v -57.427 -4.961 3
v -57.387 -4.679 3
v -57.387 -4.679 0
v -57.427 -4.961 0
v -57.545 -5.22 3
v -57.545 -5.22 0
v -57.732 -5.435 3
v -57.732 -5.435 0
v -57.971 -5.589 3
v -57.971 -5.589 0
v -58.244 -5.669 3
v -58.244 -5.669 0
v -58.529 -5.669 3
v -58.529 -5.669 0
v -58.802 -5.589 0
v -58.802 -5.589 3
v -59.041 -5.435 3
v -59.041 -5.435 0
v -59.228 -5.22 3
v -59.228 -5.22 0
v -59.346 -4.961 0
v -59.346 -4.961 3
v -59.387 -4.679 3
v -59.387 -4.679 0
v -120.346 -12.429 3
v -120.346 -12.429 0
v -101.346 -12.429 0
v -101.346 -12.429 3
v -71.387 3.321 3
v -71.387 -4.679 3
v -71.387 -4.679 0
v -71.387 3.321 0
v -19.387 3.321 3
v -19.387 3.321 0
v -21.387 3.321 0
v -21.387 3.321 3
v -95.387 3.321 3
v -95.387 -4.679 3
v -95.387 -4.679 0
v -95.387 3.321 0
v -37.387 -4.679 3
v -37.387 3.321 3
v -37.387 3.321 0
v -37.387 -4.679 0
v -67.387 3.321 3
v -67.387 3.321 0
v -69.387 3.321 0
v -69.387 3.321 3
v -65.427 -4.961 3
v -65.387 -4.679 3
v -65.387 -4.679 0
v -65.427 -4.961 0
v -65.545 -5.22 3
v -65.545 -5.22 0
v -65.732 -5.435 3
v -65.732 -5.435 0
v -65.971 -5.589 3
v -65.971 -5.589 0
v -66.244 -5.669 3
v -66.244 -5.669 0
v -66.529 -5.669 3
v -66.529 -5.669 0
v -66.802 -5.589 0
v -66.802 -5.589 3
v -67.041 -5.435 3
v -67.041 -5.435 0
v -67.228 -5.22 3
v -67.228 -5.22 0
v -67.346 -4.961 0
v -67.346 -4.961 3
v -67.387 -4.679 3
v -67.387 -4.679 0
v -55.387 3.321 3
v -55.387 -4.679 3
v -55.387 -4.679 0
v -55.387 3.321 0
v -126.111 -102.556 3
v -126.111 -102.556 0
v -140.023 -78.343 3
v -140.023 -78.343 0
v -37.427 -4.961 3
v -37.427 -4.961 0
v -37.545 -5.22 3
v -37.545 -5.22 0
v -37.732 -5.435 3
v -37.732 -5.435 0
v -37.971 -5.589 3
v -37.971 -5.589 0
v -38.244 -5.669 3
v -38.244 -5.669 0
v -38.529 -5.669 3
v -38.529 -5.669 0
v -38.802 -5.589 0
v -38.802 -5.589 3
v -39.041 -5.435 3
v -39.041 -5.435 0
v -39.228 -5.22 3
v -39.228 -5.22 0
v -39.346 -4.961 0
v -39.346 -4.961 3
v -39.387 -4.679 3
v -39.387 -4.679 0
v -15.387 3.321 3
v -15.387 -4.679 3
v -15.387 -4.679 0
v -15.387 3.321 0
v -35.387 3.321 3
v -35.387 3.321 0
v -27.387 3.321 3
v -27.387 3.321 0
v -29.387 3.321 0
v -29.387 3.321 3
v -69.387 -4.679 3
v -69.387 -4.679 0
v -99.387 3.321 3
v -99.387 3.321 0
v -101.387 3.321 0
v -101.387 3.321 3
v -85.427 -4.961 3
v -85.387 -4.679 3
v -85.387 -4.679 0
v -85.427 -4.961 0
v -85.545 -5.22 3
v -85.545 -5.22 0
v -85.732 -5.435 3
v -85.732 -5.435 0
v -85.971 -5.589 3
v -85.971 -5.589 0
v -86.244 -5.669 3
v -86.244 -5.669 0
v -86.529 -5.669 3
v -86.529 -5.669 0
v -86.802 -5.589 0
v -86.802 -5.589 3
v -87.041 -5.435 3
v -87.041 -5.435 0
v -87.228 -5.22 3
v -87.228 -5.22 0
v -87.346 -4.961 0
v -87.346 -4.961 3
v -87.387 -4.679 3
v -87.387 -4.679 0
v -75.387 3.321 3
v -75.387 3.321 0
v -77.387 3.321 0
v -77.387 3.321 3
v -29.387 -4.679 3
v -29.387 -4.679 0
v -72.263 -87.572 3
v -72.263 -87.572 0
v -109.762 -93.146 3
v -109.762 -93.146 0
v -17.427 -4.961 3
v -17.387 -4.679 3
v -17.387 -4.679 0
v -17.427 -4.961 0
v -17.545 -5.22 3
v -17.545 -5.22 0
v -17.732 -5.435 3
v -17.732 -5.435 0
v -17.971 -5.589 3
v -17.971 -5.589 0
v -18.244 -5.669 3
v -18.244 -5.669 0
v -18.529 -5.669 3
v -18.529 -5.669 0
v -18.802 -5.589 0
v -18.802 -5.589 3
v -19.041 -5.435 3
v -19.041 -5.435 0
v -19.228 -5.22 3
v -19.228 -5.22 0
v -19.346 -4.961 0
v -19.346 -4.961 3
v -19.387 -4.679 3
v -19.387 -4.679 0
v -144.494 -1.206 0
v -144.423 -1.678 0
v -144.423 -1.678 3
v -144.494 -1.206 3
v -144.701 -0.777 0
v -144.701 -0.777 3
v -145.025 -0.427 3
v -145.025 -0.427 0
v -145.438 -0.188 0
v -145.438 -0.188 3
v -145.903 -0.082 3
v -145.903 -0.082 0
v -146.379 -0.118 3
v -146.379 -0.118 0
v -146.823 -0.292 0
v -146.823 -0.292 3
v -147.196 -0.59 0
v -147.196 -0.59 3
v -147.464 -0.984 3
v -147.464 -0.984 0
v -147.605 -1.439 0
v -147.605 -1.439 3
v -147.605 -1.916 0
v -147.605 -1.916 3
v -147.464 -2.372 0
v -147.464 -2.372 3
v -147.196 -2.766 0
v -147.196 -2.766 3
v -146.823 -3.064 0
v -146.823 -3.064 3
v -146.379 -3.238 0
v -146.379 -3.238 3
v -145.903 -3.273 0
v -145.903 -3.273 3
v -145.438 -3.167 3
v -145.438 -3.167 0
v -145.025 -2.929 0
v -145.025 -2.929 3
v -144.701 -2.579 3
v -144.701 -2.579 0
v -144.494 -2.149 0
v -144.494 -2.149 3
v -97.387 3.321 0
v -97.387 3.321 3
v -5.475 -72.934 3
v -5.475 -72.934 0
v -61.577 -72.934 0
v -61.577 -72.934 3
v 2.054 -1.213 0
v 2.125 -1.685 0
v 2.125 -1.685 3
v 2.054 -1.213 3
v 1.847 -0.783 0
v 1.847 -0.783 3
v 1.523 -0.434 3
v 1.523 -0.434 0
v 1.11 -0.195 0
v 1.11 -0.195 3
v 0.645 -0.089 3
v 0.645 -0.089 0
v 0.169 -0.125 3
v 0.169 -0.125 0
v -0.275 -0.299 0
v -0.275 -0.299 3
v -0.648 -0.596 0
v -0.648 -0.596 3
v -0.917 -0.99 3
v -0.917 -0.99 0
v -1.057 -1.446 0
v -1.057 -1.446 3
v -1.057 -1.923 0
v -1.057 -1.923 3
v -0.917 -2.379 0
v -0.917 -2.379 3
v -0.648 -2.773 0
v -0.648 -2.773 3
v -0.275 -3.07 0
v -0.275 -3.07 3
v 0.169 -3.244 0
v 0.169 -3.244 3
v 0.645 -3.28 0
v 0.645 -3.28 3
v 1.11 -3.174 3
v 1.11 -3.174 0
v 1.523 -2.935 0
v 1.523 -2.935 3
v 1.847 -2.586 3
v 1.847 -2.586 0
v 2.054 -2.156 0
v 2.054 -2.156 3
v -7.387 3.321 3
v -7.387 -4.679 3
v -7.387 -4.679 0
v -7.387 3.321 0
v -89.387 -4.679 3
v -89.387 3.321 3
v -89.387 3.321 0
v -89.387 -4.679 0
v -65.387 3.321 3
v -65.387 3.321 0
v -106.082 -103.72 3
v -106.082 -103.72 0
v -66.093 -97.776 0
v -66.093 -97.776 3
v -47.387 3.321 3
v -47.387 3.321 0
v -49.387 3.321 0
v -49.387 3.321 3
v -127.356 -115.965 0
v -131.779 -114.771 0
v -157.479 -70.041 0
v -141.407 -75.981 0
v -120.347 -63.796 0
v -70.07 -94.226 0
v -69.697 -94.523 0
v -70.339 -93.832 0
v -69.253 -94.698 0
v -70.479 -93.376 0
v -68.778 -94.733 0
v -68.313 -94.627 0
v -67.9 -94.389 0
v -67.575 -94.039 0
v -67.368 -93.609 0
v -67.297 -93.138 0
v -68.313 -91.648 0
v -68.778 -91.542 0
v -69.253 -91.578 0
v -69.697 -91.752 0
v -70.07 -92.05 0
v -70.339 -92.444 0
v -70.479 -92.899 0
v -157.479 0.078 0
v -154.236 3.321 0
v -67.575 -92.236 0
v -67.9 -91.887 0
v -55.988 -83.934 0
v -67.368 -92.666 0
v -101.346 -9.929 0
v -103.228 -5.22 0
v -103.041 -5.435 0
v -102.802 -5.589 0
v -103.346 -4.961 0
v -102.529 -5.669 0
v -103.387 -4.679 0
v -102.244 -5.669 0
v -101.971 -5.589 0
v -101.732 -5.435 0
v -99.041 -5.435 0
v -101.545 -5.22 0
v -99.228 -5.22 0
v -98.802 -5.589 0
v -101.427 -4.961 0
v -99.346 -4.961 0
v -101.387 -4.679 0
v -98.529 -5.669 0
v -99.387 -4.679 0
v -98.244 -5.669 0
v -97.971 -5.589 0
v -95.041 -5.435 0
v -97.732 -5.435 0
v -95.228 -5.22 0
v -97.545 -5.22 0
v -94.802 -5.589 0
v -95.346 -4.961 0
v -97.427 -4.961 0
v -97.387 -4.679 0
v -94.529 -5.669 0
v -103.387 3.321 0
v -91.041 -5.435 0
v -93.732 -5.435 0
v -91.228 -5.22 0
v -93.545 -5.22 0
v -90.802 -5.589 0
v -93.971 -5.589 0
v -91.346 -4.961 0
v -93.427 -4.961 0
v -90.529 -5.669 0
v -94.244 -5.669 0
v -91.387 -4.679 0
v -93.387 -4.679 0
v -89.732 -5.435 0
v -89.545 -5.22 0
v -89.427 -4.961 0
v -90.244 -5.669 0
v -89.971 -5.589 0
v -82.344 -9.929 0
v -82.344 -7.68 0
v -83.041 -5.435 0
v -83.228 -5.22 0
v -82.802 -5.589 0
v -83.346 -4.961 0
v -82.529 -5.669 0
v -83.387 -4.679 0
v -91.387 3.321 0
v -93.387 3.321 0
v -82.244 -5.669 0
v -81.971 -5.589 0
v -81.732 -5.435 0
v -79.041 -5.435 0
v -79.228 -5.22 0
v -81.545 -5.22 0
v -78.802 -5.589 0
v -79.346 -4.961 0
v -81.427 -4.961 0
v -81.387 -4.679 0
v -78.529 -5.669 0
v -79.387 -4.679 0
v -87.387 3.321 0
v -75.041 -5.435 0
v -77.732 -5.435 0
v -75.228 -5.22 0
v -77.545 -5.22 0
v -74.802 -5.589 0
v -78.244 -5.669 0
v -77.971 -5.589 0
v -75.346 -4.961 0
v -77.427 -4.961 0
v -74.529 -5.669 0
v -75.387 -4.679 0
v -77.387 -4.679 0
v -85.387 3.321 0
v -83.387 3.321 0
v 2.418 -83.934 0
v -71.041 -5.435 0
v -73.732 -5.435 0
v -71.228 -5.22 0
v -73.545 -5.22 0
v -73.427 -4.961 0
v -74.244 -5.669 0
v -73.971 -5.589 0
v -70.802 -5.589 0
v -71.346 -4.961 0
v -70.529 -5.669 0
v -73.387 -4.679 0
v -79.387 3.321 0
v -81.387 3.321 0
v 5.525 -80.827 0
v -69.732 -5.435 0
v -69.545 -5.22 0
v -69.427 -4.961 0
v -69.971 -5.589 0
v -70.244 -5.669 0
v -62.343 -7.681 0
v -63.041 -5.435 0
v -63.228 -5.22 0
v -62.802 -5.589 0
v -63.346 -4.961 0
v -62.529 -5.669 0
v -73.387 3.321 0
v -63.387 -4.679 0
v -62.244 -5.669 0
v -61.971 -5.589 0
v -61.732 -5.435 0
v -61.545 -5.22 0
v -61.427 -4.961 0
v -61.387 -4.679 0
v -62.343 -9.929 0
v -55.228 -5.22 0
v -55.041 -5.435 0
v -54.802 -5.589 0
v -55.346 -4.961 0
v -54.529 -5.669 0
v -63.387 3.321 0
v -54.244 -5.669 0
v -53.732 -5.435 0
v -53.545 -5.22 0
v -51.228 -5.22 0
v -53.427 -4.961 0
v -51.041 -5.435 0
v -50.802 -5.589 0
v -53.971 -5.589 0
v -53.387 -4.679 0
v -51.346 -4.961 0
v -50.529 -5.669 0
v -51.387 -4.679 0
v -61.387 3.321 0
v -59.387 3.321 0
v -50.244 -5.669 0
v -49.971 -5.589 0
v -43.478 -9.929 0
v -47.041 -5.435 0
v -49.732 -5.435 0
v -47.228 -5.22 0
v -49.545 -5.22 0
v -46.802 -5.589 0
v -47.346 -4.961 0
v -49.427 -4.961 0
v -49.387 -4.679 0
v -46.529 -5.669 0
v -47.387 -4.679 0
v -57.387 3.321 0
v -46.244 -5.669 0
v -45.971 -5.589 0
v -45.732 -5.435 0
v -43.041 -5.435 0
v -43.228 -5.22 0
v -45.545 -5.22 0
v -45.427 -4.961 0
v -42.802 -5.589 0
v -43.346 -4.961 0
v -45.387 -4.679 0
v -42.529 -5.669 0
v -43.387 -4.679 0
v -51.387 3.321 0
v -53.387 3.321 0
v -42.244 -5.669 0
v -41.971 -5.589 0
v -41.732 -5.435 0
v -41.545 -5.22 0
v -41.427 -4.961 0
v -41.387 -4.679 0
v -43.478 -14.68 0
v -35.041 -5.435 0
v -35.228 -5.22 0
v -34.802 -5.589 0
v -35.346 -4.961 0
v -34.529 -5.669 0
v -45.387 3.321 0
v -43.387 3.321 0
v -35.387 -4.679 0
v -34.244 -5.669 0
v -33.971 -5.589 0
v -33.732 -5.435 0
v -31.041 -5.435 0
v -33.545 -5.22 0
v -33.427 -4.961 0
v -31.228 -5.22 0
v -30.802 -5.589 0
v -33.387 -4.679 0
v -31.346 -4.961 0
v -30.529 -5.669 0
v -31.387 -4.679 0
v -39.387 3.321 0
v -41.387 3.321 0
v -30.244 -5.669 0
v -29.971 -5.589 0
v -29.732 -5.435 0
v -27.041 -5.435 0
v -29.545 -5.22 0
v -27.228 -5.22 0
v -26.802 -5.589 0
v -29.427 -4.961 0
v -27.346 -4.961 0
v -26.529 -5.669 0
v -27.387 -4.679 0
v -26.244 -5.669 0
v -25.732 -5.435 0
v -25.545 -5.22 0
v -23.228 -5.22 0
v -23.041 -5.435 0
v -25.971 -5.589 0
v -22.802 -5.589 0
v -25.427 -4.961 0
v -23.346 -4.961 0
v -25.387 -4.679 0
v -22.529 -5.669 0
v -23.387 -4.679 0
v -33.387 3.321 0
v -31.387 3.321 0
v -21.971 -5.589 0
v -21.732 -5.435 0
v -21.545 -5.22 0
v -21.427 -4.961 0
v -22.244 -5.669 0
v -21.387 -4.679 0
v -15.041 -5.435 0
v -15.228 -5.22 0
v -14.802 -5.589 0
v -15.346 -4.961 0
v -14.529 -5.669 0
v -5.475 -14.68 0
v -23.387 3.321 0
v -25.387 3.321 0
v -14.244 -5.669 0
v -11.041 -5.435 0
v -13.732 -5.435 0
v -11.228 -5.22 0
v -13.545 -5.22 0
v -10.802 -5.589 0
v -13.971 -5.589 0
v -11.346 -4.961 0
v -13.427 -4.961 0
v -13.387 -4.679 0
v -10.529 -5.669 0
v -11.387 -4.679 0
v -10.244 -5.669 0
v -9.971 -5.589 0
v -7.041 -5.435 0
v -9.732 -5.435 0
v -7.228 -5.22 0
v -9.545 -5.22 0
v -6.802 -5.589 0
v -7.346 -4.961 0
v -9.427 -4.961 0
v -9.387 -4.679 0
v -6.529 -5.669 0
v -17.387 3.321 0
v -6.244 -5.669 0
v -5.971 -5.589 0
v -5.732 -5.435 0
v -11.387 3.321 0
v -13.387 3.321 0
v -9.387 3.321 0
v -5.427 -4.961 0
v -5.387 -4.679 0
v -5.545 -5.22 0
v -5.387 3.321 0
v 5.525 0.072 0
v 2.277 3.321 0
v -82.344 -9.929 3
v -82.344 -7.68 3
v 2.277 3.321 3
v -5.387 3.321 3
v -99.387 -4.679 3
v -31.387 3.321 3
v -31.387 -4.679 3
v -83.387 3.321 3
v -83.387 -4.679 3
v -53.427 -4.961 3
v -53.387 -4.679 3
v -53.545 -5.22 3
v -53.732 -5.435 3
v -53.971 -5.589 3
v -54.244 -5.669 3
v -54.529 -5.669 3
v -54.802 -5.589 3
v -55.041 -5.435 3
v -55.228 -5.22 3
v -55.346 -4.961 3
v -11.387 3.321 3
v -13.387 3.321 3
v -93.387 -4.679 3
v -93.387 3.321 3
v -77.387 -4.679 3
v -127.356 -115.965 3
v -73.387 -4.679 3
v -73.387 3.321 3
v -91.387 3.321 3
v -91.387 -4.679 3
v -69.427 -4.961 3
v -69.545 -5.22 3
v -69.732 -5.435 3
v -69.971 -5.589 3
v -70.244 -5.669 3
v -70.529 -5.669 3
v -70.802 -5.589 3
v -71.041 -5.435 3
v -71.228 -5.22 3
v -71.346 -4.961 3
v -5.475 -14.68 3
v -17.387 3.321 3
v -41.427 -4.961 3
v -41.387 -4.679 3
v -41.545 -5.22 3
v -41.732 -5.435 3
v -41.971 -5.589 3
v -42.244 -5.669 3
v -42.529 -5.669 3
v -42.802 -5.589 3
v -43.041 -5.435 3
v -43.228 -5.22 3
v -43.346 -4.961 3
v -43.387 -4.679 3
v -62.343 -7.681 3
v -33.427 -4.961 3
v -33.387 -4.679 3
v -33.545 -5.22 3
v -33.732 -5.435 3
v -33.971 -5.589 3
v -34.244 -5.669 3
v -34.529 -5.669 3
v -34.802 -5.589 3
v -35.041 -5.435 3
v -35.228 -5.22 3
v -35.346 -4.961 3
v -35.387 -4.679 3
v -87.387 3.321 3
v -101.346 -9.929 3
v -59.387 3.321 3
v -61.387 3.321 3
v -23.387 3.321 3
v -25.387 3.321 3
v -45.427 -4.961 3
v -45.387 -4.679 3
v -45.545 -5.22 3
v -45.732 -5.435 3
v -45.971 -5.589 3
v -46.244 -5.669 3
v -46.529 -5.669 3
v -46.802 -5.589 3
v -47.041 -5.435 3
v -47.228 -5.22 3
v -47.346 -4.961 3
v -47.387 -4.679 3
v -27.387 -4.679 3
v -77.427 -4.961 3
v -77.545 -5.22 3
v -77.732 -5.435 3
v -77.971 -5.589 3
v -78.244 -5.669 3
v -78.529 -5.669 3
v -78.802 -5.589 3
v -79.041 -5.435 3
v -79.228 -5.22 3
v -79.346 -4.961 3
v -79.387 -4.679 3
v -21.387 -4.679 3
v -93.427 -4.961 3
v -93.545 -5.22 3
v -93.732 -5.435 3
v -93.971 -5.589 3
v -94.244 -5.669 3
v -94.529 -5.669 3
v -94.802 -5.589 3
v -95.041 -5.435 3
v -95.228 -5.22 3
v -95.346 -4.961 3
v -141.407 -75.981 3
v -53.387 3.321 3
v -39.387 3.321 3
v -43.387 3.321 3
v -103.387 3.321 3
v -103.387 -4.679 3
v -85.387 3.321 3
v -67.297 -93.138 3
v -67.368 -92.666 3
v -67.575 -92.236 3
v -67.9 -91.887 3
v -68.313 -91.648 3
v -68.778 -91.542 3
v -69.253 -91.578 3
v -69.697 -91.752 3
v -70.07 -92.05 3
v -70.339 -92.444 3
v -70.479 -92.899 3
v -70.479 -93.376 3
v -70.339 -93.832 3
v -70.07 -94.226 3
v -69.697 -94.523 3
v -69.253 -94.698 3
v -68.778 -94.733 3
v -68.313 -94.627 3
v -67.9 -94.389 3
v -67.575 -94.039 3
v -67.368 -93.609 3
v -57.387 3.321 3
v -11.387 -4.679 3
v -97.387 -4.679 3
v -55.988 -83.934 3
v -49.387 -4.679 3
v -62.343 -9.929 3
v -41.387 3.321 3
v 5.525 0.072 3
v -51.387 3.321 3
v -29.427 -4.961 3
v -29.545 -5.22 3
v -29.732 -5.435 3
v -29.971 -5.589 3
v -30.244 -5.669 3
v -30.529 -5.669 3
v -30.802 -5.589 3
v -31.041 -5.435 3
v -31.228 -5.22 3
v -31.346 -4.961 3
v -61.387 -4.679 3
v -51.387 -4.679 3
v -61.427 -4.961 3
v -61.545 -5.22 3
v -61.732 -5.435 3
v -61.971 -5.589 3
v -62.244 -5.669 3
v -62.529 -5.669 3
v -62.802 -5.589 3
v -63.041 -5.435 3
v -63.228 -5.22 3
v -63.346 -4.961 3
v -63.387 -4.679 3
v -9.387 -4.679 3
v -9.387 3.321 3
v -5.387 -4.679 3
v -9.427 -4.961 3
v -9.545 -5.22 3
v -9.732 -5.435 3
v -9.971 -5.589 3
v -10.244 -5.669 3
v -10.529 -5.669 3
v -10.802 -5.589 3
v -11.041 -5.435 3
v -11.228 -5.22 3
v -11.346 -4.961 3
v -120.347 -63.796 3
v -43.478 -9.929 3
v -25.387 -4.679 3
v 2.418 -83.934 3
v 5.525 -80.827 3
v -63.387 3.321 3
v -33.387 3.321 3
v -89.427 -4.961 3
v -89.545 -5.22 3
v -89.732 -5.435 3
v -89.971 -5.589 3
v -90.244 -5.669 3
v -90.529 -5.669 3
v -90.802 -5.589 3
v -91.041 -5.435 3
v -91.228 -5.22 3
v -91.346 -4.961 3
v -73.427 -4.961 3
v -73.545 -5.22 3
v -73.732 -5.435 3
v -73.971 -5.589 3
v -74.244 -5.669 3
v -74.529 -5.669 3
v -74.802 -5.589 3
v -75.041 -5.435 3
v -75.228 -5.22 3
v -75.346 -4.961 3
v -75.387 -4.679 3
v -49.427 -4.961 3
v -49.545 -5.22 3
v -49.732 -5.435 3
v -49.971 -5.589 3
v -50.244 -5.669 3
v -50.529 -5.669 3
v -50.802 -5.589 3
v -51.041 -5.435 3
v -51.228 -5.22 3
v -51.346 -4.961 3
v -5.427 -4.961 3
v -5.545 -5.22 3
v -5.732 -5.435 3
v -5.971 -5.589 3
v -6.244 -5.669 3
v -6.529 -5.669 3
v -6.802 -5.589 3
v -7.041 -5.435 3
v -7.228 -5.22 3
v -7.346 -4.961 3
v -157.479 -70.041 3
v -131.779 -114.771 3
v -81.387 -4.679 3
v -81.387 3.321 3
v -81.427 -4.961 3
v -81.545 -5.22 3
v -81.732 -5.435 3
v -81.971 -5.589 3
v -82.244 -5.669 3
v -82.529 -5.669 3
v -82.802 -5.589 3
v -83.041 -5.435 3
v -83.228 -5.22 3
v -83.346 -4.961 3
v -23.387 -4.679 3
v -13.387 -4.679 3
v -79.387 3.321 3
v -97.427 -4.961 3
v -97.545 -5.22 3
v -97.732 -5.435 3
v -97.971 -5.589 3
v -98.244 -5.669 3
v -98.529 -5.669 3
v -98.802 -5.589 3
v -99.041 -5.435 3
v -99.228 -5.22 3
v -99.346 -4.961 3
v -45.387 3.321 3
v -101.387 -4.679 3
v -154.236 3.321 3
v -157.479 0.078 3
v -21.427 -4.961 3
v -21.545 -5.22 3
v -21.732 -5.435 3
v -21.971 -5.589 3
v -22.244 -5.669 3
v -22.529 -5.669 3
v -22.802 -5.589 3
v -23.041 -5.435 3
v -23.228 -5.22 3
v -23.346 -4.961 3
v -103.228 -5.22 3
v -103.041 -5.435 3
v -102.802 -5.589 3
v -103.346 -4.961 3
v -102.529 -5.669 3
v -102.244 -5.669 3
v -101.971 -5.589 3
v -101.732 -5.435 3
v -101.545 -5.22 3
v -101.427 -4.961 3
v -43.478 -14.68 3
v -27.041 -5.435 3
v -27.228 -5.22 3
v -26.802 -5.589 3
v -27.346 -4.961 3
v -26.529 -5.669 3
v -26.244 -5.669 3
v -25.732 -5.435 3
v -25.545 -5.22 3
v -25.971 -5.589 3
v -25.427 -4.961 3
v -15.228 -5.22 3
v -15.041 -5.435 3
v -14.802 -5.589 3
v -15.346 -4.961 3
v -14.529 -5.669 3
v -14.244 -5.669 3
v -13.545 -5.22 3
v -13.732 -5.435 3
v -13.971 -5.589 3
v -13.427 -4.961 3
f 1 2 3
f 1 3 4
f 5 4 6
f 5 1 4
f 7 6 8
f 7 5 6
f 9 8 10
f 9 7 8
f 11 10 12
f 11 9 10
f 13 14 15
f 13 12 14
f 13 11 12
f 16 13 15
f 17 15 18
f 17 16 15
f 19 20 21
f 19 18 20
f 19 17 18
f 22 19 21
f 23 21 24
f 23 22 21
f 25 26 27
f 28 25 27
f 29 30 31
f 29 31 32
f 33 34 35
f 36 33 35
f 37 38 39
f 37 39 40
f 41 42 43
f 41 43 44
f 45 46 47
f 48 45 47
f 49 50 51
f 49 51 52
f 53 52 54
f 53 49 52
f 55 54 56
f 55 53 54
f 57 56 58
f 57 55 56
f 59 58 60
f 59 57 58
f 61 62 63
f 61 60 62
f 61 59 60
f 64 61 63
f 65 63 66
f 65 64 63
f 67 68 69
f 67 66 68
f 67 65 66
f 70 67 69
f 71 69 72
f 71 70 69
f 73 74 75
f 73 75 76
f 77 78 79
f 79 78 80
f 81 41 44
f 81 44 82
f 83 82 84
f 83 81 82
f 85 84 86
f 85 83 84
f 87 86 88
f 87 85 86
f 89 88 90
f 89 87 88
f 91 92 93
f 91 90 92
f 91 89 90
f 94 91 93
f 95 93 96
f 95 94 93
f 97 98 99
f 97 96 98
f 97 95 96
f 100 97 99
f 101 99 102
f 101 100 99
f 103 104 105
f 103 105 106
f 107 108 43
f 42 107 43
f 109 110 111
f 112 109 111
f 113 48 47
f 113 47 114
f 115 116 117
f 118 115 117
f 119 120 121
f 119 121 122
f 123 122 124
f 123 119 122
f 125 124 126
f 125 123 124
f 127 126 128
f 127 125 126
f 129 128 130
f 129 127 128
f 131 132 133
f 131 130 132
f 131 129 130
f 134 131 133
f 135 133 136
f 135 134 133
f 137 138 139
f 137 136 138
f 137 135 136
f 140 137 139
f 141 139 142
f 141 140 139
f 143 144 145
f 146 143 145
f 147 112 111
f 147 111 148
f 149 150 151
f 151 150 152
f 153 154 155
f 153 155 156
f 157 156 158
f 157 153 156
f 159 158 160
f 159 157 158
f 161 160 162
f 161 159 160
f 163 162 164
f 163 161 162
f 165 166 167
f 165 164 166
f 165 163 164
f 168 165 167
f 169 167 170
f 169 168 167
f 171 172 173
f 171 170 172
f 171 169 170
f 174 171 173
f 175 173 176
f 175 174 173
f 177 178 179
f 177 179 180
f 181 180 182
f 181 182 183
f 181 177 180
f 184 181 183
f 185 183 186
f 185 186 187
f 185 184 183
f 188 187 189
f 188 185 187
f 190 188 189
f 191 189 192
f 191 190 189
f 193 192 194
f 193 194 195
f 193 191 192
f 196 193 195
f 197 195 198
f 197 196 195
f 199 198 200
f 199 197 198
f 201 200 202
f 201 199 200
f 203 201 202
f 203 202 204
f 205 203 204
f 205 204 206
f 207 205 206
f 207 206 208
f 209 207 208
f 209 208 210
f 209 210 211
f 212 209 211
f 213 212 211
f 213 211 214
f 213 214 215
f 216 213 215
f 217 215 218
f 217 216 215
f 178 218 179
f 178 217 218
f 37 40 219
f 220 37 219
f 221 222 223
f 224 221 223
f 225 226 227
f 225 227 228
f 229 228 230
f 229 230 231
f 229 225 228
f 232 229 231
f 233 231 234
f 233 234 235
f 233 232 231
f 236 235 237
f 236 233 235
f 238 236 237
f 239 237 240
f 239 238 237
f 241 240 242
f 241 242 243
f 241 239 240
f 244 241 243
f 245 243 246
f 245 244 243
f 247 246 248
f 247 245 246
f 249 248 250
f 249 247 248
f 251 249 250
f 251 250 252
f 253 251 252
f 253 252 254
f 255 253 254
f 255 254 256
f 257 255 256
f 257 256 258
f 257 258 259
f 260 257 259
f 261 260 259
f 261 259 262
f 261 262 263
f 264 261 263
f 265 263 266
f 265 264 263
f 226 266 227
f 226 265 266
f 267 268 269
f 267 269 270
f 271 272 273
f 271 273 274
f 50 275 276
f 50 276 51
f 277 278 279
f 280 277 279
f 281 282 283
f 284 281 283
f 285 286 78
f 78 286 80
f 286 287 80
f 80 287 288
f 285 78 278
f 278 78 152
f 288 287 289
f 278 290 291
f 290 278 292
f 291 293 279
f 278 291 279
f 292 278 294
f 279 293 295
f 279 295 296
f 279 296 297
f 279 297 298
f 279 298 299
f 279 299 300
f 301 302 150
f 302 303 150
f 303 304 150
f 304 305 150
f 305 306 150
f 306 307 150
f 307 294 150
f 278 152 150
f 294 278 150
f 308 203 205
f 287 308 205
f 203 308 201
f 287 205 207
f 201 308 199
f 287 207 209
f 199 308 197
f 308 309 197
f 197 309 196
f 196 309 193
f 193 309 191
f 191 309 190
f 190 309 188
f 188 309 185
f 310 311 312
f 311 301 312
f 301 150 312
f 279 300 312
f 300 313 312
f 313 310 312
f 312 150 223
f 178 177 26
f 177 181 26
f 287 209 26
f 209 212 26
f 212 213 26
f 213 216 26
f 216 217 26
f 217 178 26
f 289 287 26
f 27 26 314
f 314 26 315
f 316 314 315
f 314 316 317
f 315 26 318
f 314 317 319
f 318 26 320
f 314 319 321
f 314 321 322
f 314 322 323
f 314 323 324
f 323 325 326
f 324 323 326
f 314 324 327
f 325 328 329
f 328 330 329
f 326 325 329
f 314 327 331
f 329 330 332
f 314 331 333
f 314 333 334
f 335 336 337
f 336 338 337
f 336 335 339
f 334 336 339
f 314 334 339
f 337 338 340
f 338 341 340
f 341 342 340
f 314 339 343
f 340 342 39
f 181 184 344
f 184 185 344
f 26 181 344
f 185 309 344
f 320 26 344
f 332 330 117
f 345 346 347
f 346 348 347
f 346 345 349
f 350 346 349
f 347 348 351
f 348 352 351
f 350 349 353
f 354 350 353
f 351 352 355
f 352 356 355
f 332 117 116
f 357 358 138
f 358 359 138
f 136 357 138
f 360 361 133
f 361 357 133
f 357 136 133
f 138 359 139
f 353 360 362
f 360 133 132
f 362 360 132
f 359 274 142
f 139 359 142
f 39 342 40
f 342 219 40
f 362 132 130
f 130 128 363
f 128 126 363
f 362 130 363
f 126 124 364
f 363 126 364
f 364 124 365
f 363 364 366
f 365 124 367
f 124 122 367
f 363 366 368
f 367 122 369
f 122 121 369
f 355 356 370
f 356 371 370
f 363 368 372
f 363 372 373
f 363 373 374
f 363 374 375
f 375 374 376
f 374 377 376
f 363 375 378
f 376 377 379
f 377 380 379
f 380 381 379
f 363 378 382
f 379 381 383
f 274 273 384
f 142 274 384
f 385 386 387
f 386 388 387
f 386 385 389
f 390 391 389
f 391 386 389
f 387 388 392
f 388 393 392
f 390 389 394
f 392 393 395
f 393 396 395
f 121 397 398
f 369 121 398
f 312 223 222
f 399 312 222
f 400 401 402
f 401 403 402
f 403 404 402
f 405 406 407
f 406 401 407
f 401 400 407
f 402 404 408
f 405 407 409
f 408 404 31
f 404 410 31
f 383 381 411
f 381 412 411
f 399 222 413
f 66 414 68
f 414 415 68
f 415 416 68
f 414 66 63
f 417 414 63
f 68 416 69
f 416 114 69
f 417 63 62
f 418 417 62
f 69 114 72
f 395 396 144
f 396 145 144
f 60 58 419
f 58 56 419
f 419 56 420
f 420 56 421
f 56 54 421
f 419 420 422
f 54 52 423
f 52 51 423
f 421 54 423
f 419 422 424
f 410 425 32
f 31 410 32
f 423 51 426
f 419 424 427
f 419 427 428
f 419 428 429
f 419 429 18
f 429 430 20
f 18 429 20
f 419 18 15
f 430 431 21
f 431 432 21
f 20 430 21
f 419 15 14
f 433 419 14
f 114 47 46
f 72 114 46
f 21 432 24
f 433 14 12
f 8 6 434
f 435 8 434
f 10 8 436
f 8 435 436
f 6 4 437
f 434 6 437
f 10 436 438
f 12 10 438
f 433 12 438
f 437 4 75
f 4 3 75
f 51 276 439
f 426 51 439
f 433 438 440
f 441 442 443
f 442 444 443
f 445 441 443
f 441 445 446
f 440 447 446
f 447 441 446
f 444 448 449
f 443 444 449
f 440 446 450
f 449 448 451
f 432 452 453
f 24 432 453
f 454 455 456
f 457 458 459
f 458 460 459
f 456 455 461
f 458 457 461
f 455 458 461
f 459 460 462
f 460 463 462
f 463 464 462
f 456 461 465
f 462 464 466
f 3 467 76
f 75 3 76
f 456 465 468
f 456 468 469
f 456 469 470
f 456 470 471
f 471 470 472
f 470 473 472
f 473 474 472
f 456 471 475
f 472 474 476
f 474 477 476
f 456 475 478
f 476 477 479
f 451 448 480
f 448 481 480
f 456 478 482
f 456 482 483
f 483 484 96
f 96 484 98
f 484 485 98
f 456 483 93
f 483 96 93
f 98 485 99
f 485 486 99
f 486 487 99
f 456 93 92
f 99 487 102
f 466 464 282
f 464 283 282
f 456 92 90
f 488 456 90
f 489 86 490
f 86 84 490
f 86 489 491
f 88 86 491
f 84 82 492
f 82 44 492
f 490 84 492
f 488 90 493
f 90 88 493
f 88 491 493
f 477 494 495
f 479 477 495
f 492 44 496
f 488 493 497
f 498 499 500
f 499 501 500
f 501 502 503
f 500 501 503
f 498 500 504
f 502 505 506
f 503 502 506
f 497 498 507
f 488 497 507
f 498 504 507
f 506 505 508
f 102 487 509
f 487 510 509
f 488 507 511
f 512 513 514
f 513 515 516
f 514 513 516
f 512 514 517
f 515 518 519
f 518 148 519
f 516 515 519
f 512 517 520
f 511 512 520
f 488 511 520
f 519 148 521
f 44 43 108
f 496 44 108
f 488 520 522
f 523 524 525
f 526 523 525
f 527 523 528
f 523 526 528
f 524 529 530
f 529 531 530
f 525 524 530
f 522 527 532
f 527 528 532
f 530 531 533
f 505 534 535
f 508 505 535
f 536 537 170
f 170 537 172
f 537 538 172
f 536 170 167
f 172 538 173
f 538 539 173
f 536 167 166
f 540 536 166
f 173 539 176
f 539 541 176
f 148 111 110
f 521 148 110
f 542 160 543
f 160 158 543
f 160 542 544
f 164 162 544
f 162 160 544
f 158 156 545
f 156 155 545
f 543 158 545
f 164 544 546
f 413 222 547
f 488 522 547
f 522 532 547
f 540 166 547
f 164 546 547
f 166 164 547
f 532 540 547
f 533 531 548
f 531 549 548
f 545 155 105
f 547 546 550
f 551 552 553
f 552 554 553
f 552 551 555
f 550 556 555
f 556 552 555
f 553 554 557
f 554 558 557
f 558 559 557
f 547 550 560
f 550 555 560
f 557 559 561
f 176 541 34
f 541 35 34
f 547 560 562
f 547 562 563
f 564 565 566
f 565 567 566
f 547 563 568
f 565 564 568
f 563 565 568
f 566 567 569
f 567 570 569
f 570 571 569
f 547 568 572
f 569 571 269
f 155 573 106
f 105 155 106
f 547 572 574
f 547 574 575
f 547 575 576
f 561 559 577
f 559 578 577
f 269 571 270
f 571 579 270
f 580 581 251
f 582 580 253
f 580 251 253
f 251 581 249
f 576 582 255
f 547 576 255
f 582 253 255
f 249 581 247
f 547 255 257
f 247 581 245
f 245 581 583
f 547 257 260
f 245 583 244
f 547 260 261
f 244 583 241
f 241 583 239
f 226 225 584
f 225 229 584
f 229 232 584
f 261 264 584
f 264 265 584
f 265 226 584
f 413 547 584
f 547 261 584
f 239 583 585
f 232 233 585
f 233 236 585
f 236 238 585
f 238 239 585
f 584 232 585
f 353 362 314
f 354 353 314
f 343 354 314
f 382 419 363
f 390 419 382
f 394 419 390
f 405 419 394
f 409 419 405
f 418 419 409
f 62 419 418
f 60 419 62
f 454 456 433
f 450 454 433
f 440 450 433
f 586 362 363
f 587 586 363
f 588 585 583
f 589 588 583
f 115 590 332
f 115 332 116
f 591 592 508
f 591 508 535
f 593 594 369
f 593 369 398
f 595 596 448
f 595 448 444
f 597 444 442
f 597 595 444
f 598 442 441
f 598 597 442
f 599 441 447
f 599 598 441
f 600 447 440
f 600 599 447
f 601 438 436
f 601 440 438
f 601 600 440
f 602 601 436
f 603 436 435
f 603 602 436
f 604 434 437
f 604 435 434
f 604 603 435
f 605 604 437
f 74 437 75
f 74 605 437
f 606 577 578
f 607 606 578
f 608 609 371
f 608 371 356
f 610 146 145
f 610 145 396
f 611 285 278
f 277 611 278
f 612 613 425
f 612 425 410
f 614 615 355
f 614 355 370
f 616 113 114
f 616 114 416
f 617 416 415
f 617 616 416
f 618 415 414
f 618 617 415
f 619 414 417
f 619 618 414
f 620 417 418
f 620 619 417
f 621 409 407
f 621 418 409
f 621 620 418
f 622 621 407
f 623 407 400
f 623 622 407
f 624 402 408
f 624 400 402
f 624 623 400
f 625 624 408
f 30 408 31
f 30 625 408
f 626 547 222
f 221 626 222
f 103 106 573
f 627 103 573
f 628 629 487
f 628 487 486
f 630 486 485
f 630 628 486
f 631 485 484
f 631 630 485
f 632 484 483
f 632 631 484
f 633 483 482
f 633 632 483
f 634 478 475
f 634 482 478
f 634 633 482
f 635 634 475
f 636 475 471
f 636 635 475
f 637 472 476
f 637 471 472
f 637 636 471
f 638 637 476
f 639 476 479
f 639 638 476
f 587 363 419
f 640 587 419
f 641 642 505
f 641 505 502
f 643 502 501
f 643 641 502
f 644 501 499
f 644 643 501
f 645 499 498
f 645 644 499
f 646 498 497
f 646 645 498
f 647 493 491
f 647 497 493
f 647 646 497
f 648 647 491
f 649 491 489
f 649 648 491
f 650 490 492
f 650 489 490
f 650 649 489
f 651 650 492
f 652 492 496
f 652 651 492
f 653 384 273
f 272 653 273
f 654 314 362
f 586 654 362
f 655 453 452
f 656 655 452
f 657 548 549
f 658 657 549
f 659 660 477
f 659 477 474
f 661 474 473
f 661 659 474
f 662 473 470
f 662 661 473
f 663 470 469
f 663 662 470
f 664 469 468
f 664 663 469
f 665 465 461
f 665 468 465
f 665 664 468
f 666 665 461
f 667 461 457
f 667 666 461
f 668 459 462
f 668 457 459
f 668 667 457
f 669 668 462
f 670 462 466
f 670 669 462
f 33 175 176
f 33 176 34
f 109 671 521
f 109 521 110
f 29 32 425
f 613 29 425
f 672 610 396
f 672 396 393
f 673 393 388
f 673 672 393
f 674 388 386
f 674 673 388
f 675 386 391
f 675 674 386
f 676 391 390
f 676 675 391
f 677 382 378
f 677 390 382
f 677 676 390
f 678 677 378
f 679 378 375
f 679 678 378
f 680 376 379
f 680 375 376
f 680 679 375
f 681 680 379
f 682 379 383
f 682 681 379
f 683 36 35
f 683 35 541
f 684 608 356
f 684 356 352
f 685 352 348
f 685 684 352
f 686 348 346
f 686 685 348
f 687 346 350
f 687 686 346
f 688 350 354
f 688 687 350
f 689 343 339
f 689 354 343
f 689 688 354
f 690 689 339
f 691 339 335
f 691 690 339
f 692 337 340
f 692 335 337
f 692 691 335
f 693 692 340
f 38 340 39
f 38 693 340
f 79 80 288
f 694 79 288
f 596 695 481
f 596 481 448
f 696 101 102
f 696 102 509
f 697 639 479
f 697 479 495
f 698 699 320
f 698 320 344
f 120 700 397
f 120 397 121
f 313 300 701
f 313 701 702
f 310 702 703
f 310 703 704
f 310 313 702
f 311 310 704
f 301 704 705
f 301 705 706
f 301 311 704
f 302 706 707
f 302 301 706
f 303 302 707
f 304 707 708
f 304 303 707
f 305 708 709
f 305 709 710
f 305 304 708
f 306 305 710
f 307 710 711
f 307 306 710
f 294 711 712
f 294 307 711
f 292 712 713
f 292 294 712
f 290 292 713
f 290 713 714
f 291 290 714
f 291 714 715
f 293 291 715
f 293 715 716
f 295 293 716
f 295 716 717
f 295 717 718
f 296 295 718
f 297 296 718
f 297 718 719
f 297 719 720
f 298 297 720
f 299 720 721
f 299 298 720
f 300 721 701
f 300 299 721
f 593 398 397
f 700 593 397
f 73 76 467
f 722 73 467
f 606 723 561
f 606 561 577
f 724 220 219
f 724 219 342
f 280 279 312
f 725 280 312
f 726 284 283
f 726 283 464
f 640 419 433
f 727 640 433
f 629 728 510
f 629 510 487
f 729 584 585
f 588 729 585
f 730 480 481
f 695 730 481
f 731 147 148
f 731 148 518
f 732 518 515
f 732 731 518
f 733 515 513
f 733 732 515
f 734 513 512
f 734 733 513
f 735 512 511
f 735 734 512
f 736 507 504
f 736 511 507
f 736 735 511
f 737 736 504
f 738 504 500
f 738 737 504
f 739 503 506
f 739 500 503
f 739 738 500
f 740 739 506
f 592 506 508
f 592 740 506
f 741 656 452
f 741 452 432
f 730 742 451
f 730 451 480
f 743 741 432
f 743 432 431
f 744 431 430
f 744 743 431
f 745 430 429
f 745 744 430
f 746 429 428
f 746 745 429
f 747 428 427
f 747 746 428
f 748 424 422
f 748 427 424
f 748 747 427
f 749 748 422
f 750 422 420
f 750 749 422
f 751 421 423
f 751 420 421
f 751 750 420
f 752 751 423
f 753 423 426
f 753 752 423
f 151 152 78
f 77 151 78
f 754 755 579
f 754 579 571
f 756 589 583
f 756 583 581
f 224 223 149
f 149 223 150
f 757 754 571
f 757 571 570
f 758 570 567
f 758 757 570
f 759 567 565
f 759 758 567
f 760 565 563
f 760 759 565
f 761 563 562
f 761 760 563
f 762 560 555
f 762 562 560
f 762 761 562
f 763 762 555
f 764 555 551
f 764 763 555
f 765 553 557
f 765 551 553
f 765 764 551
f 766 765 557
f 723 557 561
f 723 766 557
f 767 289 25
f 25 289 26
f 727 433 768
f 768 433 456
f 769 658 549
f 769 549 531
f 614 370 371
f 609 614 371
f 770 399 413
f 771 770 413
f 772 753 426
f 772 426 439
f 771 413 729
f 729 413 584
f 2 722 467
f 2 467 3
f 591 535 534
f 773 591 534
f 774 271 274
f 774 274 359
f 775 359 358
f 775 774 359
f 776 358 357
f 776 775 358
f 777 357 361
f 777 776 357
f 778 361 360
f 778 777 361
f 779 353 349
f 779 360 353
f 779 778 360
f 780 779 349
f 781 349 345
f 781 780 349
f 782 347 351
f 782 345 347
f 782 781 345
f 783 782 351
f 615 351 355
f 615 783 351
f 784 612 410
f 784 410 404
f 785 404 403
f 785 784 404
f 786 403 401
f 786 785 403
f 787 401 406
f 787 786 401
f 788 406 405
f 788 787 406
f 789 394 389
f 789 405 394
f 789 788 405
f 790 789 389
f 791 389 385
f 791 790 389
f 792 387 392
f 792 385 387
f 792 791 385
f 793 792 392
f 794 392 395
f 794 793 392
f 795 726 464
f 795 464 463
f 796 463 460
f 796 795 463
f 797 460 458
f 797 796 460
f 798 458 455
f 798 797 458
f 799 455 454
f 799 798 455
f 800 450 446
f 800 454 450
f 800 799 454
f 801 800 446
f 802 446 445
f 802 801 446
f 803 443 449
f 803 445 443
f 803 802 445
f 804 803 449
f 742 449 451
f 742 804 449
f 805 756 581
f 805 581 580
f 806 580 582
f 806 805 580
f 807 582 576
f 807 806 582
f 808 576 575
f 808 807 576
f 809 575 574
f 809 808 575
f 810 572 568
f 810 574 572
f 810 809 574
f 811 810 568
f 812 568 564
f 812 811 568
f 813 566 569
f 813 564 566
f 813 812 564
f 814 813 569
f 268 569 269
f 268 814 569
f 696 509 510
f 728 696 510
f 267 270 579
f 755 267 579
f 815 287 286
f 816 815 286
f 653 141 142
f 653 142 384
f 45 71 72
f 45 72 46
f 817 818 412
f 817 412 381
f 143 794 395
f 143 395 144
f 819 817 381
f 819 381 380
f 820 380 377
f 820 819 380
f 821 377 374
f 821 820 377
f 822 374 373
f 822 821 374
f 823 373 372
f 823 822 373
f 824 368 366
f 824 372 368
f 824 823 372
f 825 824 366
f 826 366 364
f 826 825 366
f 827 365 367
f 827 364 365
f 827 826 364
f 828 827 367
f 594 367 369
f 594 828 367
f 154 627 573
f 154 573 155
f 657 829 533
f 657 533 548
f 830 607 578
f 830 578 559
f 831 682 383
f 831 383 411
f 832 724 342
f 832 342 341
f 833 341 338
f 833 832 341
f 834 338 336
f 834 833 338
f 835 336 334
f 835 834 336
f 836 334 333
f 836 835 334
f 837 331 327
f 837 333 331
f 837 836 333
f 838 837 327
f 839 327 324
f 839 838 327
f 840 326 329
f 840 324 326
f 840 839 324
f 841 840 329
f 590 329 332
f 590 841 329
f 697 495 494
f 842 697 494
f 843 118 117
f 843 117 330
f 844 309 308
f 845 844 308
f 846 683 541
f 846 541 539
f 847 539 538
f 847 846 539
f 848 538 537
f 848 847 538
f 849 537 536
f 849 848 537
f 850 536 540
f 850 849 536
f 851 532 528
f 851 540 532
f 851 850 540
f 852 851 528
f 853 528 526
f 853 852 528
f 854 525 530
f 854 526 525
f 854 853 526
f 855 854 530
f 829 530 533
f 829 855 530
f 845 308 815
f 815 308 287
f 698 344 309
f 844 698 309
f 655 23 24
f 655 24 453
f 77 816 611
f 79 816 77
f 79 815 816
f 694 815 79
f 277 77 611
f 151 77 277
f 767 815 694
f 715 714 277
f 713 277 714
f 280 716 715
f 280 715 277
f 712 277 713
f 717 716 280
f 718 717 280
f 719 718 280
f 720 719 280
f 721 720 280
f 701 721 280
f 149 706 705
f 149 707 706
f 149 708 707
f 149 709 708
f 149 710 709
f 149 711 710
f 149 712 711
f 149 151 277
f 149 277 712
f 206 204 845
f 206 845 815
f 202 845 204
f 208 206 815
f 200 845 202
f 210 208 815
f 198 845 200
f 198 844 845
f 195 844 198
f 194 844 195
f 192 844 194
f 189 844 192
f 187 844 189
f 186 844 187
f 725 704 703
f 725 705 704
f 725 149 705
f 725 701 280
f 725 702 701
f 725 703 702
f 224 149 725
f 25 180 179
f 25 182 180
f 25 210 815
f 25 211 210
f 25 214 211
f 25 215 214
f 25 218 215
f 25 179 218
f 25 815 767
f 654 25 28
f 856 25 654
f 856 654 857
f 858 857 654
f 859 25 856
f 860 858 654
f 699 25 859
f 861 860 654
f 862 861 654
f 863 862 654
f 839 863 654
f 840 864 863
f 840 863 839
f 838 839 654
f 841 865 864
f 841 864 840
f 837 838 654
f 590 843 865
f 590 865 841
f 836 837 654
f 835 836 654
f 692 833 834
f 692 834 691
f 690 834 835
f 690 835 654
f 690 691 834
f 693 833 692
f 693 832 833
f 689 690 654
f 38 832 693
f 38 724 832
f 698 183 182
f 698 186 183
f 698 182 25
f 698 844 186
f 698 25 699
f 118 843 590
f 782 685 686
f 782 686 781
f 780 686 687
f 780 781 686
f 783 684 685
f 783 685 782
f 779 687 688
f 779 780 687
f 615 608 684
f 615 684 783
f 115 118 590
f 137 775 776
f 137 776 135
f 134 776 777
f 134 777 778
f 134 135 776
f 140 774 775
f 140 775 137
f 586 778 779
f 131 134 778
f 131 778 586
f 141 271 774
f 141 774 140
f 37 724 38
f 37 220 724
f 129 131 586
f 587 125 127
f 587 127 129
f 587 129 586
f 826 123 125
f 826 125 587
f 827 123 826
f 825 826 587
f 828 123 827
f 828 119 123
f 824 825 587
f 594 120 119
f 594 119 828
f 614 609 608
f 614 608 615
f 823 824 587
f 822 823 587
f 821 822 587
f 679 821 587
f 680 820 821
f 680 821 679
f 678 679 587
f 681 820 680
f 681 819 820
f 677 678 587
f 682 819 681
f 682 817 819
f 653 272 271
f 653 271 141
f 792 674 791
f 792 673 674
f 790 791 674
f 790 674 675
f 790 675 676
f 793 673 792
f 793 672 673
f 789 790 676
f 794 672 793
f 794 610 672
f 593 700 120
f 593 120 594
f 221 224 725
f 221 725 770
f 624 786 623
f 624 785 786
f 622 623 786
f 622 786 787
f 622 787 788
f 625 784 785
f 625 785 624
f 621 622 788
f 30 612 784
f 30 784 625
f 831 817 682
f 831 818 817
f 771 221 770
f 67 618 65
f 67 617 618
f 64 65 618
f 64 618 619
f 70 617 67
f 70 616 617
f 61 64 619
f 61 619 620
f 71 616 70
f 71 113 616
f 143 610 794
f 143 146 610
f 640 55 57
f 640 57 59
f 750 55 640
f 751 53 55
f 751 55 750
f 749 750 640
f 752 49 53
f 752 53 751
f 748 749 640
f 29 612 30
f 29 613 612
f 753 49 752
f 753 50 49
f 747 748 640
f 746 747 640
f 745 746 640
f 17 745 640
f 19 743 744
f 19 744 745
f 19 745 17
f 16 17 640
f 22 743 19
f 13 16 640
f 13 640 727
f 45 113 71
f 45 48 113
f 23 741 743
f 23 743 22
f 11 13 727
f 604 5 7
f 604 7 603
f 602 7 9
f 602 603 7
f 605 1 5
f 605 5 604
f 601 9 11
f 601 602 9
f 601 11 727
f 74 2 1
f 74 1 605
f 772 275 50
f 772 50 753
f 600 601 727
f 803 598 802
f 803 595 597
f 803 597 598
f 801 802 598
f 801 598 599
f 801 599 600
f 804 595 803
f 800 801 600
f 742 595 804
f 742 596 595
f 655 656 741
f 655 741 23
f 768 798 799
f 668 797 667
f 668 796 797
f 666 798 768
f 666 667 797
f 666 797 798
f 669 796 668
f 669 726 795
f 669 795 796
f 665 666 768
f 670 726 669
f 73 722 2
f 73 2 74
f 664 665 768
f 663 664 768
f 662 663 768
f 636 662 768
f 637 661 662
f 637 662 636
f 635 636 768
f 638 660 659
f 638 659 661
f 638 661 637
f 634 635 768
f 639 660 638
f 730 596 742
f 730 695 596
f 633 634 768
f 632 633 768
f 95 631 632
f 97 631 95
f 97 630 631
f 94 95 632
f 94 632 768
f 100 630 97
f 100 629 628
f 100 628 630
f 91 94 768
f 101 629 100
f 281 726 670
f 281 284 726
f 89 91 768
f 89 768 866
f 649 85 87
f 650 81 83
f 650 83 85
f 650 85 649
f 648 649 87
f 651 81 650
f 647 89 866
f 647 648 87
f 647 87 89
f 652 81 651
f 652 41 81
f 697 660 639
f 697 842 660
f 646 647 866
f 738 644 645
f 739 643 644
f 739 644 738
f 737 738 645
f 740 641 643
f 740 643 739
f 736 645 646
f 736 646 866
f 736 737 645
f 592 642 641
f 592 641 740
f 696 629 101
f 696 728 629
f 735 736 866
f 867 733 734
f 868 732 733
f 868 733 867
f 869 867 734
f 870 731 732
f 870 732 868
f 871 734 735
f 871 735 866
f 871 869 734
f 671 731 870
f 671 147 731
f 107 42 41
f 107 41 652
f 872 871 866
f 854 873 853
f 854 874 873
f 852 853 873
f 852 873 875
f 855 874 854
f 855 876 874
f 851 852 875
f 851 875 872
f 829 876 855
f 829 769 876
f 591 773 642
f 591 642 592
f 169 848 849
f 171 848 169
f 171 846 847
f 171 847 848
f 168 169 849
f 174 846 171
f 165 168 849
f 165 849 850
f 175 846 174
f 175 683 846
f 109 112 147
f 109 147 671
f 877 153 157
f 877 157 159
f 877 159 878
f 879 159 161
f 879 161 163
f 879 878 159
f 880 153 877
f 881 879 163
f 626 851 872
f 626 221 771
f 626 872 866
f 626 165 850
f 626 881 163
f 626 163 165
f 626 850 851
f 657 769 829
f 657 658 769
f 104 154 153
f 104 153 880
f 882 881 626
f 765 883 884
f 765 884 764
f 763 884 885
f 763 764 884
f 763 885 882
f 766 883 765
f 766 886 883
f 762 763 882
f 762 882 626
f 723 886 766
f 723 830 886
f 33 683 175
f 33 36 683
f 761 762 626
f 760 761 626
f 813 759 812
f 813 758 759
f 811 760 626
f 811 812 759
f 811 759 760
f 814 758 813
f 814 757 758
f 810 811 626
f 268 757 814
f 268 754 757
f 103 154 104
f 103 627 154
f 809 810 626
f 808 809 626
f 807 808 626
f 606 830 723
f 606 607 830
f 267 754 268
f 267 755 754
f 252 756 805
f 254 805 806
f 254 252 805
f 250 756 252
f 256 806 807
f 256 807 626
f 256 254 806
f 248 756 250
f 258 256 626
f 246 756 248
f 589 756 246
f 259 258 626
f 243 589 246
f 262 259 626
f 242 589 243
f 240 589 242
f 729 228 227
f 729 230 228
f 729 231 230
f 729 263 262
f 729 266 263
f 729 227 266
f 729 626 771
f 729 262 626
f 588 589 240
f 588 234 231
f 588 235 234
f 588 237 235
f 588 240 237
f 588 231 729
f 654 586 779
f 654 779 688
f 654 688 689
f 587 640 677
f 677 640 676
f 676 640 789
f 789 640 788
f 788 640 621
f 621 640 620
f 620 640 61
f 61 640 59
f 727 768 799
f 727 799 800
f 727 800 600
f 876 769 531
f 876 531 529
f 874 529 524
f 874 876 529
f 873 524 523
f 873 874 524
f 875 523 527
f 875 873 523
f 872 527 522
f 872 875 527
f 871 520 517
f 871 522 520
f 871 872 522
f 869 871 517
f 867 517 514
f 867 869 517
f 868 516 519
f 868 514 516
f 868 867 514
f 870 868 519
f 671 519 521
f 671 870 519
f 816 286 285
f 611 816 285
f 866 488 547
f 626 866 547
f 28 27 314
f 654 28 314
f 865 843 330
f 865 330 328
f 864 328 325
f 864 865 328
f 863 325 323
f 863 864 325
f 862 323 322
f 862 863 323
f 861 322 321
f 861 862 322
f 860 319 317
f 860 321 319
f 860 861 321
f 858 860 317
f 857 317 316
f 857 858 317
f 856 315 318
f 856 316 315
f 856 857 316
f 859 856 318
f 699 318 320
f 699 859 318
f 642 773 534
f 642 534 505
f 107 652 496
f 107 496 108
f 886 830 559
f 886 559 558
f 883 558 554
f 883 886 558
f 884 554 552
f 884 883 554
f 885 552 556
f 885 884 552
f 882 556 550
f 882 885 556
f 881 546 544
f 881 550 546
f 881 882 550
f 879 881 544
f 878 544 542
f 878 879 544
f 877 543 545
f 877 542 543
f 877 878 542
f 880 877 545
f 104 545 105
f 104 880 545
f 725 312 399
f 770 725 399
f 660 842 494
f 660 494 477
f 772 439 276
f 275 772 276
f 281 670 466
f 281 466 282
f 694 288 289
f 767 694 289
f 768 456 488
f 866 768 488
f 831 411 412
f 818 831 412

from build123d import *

# Parameters (mm, degrees)
ESQUISSE1_R             = 1.6
BOSS_EXTRU_1_DEPTH      = 3
ENL_V_MAT_EXTRU_1_DEPTH = 10


with BuildPart() as part:
    # Esquisse1 → Boss.-Extru.1 (new body)
    with BuildSketch(Plane.XY):
        Polygon((5.525007543, 0.072428093), (2.276763789, 3.320852512), (-154.236345188, 3.320852512), (-157.478985875, 0.078211825), (-157.478985875, -70.04068474), (-131.779420125, -114.771472067), (-127.355917516, -115.9649154), (-106.081983802, -103.720194839), (-66.092540926, -97.775797545), (-55.98795635, -83.933633781), (2.418252352, -83.933633781), (5.525007543, -80.826878591), align=None)
        Polygon((-126.111124489, -102.556497988), (-140.02282508, -78.342807898), (-141.407217303, -75.981121034), (-120.346626934, -63.796065222), (-120.346308835, -12.429484403), (-101.345774335, -12.429484403), (-101.345774335, -9.929307079), (-82.344426674, -9.929307079), (-82.344426674, -7.679926158), (-62.343149943, -7.681038584), (-62.343149943, -9.929307079), (-43.477687779, -9.929307079), (-43.477687779, -14.679643994), (-5.474992457, -14.679643994), (-5.474992457, -72.933633781), (-61.577157206, -72.933633781), (-72.263087593, -87.572177036), (-109.761976756, -93.1463556), align=None, mode=Mode.SUBTRACT)
        with Locations((-68.897334865, -93.137788223)):
            Circle(ESQUISSE1_R, mode=Mode.SUBTRACT)
        with Locations((-146.02282508, -1.677868186)):
            Circle(ESQUISSE1_R, mode=Mode.SUBTRACT)
        with Locations((0.525007543, -1.68453516)):
            Circle(ESQUISSE1_R, mode=Mode.SUBTRACT)
    extrude(amount=BOSS_EXTRU_1_DEPTH)

    # Esquisse2 → Enlèv. mat.-Extru.1 (cut)
    with BuildSketch(Plane.XY.offset(3)):
        with BuildLine():
            Line((-5.386559375, 6.054162745), (-5.386559375, -4.679147488))
            ThreePointArc((-5.386559375, -4.679147488), (-6.386559375, -5.679147488), (-7.386559375, -4.679147488))
            Line((-7.386559375, -4.679147488), (-7.386559375, 6.054162745))
            ThreePointArc((-7.386559375, 6.054162745), (-6.386559375, 7.054162745), (-5.386559375, 6.054162745))
        make_face()
        with BuildLine():
            Line((-9.386559375, 6.054162745), (-9.386559375, -4.679147488))
            ThreePointArc((-9.386559375, -4.679147488), (-10.386559375, -5.679147488), (-11.386559375, -4.679147488))
            Line((-11.386559375, -4.679147488), (-11.386559375, 6.054162745))
            ThreePointArc((-11.386559375, 6.054162745), (-10.386559375, 7.054162745), (-9.386559375, 6.054162745))
        make_face()
        with BuildLine():
            Line((-13.386559375, 6.054162745), (-13.386559375, -4.679147488))
            ThreePointArc((-13.386559375, -4.679147488), (-14.386559375, -5.679147488), (-15.386559375, -4.679147488))
            Line((-15.386559375, -4.679147488), (-15.386559375, 6.054162745))
            ThreePointArc((-15.386559375, 6.054162745), (-14.386559375, 7.054162745), (-13.386559375, 6.054162745))
        make_face()
        with BuildLine():
            Line((-17.386559375, 6.054162745), (-17.386559375, -4.679147488))
            ThreePointArc((-17.386559375, -4.679147488), (-18.386559375, -5.679147488), (-19.386559375, -4.679147488))
            Line((-19.386559375, -4.679147488), (-19.386559375, 6.054162745))
            ThreePointArc((-19.386559375, 6.054162745), (-18.386559375, 7.054162745), (-17.386559375, 6.054162745))
        make_face()
        with BuildLine():
            Line((-21.386559375, 6.054162745), (-21.386559375, -4.679147488))
            ThreePointArc((-21.386559375, -4.679147488), (-22.386559375, -5.679147488), (-23.386559375, -4.679147488))
            Line((-23.386559375, -4.679147488), (-23.386559375, 6.054162745))
            ThreePointArc((-23.386559375, 6.054162745), (-22.386559375, 7.054162745), (-21.386559375, 6.054162745))
        make_face()
        with BuildLine():
            Line((-25.386559375, 6.054162745), (-25.386559375, -4.679147488))
            ThreePointArc((-25.386559375, -4.679147488), (-26.386559375, -5.679147488), (-27.386559375, -4.679147488))
            Line((-27.386559375, -4.679147488), (-27.386559375, 6.054162745))
            ThreePointArc((-27.386559375, 6.054162745), (-26.386559375, 7.054162745), (-25.386559375, 6.054162745))
        make_face()
        with BuildLine():
            Line((-29.386559375, 6.054162745), (-29.386559375, -4.679147488))
            ThreePointArc((-29.386559375, -4.679147488), (-30.386559375, -5.679147488), (-31.386559375, -4.679147488))
            Line((-31.386559375, -4.679147488), (-31.386559375, 6.054162745))
            ThreePointArc((-31.386559375, 6.054162745), (-30.386559375, 7.054162745), (-29.386559375, 6.054162745))
        make_face()
        with BuildLine():
            Line((-33.386559375, 6.054162745), (-33.386559375, -4.679147488))
            ThreePointArc((-33.386559375, -4.679147488), (-34.386559375, -5.679147488), (-35.386559375, -4.679147488))
            Line((-35.386559375, -4.679147488), (-35.386559375, 6.054162745))
            ThreePointArc((-35.386559375, 6.054162745), (-34.386559375, 7.054162745), (-33.386559375, 6.054162745))
        make_face()
        with BuildLine():
            Line((-37.386559375, 6.054162745), (-37.386559375, -4.679147488))
            ThreePointArc((-37.386559375, -4.679147488), (-38.386559375, -5.679147488), (-39.386559375, -4.679147488))
            Line((-39.386559375, -4.679147488), (-39.386559375, 6.054162745))
            ThreePointArc((-39.386559375, 6.054162745), (-38.386559375, 7.054162745), (-37.386559375, 6.054162745))
        make_face()
        with BuildLine():
            Line((-41.386559375, 6.054162745), (-41.386559375, -4.679147488))
            ThreePointArc((-41.386559375, -4.679147488), (-42.386559375, -5.679147488), (-43.386559375, -4.679147488))
            Line((-43.386559375, -4.679147488), (-43.386559375, 6.054162745))
            ThreePointArc((-43.386559375, 6.054162745), (-42.386559375, 7.054162745), (-41.386559375, 6.054162745))
        make_face()
        with BuildLine():
            Line((-45.386559375, 6.054162745), (-45.386559375, -4.679147488))
            ThreePointArc((-45.386559375, -4.679147488), (-46.386559375, -5.679147488), (-47.386559375, -4.679147488))
            Line((-47.386559375, -4.679147488), (-47.386559375, 6.054162745))
            ThreePointArc((-47.386559375, 6.054162745), (-46.386559375, 7.054162745), (-45.386559375, 6.054162745))
        make_face()
        with BuildLine():
            Line((-49.386559375, 6.054162745), (-49.386559375, -4.679147488))
            ThreePointArc((-49.386559375, -4.679147488), (-50.386559375, -5.679147488), (-51.386559375, -4.679147488))
            Line((-51.386559375, -4.679147488), (-51.386559375, 6.054162745))
            ThreePointArc((-51.386559375, 6.054162745), (-50.386559375, 7.054162745), (-49.386559375, 6.054162745))
        make_face()
        with BuildLine():
            Line((-53.386559375, 6.054162745), (-53.386559375, -4.679147488))
            ThreePointArc((-53.386559375, -4.679147488), (-54.386559375, -5.679147488), (-55.386559375, -4.679147488))
            Line((-55.386559375, -4.679147488), (-55.386559375, 6.054162745))
            ThreePointArc((-55.386559375, 6.054162745), (-54.386559375, 7.054162745), (-53.386559375, 6.054162745))
        make_face()
        with BuildLine():
            Line((-57.386559375, 6.054162745), (-57.386559375, -4.679147488))
            ThreePointArc((-57.386559375, -4.679147488), (-58.386559375, -5.679147488), (-59.386559375, -4.679147488))
            Line((-59.386559375, -4.679147488), (-59.386559375, 6.054162745))
            ThreePointArc((-59.386559375, 6.054162745), (-58.386559375, 7.054162745), (-57.386559375, 6.054162745))
        make_face()
        with BuildLine():
            Line((-61.386559375, 6.054162745), (-61.386559375, -4.679147488))
            ThreePointArc((-61.386559375, -4.679147488), (-62.386559375, -5.679147488), (-63.386559375, -4.679147488))
            Line((-63.386559375, -4.679147488), (-63.386559375, 6.054162745))
            ThreePointArc((-63.386559375, 6.054162745), (-62.386559375, 7.054162745), (-61.386559375, 6.054162745))
        make_face()
        with BuildLine():
            Line((-65.386559375, 6.054162745), (-65.386559375, -4.679147488))
            ThreePointArc((-65.386559375, -4.679147488), (-66.386559375, -5.679147488), (-67.386559375, -4.679147488))
            Line((-67.386559375, -4.679147488), (-67.386559375, 6.054162745))
            ThreePointArc((-67.386559375, 6.054162745), (-66.386559375, 7.054162745), (-65.386559375, 6.054162745))
        make_face()
        with BuildLine():
            Line((-69.386559375, 6.054162745), (-69.386559375, -4.679147488))
            ThreePointArc((-69.386559375, -4.679147488), (-70.386559375, -5.679147488), (-71.386559375, -4.679147488))
            Line((-71.386559375, -4.679147488), (-71.386559375, 6.054162745))
            ThreePointArc((-71.386559375, 6.054162745), (-70.386559375, 7.054162745), (-69.386559375, 6.054162745))
        make_face()
        with BuildLine():
            Line((-73.386559375, 6.054162745), (-73.386559375, -4.679147488))
            ThreePointArc((-73.386559375, -4.679147488), (-74.386559375, -5.679147488), (-75.386559375, -4.679147488))
            Line((-75.386559375, -4.679147488), (-75.386559375, 6.054162745))
            ThreePointArc((-75.386559375, 6.054162745), (-74.386559375, 7.054162745), (-73.386559375, 6.054162745))
        make_face()
        with BuildLine():
            Line((-77.386559375, 6.054162745), (-77.386559375, -4.679147488))
            ThreePointArc((-77.386559375, -4.679147488), (-78.386559375, -5.679147488), (-79.386559375, -4.679147488))
            Line((-79.386559375, -4.679147488), (-79.386559375, 6.054162745))
            ThreePointArc((-79.386559375, 6.054162745), (-78.386559375, 7.054162745), (-77.386559375, 6.054162745))
        make_face()
        with BuildLine():
            Line((-81.386559375, 6.054162745), (-81.386559375, -4.679147488))
            ThreePointArc((-81.386559375, -4.679147488), (-82.386559375, -5.679147488), (-83.386559375, -4.679147488))
            Line((-83.386559375, -4.679147488), (-83.386559375, 6.054162745))
            ThreePointArc((-83.386559375, 6.054162745), (-82.386559375, 7.054162745), (-81.386559375, 6.054162745))
        make_face()
        with BuildLine():
            Line((-85.386559375, 6.054162745), (-85.386559375, -4.679147488))
            ThreePointArc((-85.386559375, -4.679147488), (-86.386559375, -5.679147488), (-87.386559375, -4.679147488))
            Line((-87.386559375, -4.679147488), (-87.386559375, 6.054162745))
            ThreePointArc((-87.386559375, 6.054162745), (-86.386559375, 7.054162745), (-85.386559375, 6.054162745))
        make_face()
        with BuildLine():
            Line((-89.386559375, 6.054162745), (-89.386559375, -4.679147488))
            ThreePointArc((-89.386559375, -4.679147488), (-90.386559375, -5.679147488), (-91.386559375, -4.679147488))
            Line((-91.386559375, -4.679147488), (-91.386559375, 6.054162745))
            ThreePointArc((-91.386559375, 6.054162745), (-90.386559375, 7.054162745), (-89.386559375, 6.054162745))
        make_face()
        with BuildLine():
            Line((-93.386559375, 6.054162745), (-93.386559375, -4.679147488))
            ThreePointArc((-93.386559375, -4.679147488), (-94.386559375, -5.679147488), (-95.386559375, -4.679147488))
            Line((-95.386559375, -4.679147488), (-95.386559375, 6.054162745))
            ThreePointArc((-95.386559375, 6.054162745), (-94.386559375, 7.054162745), (-93.386559375, 6.054162745))
        make_face()
        with BuildLine():
            Line((-97.386559375, 6.054162745), (-97.386559375, -4.679147488))
            ThreePointArc((-97.386559375, -4.679147488), (-98.386559375, -5.679147488), (-99.386559375, -4.679147488))
            Line((-99.386559375, -4.679147488), (-99.386559375, 6.054162745))
            ThreePointArc((-99.386559375, 6.054162745), (-98.386559375, 7.054162745), (-97.386559375, 6.054162745))
        make_face()
        with BuildLine():
            Line((-101.386559375, 6.054162745), (-101.386559375, -4.679147488))
            ThreePointArc((-101.386559375, -4.679147488), (-102.386559375, -5.679147488), (-103.386559375, -4.679147488))
            Line((-103.386559375, -4.679147488), (-103.386559375, 6.054162745))
            ThreePointArc((-103.386559375, 6.054162745), (-102.386559375, 7.054162745), (-101.386559375, 6.054162745))
        make_face()
    extrude(amount=-ENL_V_MAT_EXTRU_1_DEPTH, mode=Mode.SUBTRACT)


solid = part.part
